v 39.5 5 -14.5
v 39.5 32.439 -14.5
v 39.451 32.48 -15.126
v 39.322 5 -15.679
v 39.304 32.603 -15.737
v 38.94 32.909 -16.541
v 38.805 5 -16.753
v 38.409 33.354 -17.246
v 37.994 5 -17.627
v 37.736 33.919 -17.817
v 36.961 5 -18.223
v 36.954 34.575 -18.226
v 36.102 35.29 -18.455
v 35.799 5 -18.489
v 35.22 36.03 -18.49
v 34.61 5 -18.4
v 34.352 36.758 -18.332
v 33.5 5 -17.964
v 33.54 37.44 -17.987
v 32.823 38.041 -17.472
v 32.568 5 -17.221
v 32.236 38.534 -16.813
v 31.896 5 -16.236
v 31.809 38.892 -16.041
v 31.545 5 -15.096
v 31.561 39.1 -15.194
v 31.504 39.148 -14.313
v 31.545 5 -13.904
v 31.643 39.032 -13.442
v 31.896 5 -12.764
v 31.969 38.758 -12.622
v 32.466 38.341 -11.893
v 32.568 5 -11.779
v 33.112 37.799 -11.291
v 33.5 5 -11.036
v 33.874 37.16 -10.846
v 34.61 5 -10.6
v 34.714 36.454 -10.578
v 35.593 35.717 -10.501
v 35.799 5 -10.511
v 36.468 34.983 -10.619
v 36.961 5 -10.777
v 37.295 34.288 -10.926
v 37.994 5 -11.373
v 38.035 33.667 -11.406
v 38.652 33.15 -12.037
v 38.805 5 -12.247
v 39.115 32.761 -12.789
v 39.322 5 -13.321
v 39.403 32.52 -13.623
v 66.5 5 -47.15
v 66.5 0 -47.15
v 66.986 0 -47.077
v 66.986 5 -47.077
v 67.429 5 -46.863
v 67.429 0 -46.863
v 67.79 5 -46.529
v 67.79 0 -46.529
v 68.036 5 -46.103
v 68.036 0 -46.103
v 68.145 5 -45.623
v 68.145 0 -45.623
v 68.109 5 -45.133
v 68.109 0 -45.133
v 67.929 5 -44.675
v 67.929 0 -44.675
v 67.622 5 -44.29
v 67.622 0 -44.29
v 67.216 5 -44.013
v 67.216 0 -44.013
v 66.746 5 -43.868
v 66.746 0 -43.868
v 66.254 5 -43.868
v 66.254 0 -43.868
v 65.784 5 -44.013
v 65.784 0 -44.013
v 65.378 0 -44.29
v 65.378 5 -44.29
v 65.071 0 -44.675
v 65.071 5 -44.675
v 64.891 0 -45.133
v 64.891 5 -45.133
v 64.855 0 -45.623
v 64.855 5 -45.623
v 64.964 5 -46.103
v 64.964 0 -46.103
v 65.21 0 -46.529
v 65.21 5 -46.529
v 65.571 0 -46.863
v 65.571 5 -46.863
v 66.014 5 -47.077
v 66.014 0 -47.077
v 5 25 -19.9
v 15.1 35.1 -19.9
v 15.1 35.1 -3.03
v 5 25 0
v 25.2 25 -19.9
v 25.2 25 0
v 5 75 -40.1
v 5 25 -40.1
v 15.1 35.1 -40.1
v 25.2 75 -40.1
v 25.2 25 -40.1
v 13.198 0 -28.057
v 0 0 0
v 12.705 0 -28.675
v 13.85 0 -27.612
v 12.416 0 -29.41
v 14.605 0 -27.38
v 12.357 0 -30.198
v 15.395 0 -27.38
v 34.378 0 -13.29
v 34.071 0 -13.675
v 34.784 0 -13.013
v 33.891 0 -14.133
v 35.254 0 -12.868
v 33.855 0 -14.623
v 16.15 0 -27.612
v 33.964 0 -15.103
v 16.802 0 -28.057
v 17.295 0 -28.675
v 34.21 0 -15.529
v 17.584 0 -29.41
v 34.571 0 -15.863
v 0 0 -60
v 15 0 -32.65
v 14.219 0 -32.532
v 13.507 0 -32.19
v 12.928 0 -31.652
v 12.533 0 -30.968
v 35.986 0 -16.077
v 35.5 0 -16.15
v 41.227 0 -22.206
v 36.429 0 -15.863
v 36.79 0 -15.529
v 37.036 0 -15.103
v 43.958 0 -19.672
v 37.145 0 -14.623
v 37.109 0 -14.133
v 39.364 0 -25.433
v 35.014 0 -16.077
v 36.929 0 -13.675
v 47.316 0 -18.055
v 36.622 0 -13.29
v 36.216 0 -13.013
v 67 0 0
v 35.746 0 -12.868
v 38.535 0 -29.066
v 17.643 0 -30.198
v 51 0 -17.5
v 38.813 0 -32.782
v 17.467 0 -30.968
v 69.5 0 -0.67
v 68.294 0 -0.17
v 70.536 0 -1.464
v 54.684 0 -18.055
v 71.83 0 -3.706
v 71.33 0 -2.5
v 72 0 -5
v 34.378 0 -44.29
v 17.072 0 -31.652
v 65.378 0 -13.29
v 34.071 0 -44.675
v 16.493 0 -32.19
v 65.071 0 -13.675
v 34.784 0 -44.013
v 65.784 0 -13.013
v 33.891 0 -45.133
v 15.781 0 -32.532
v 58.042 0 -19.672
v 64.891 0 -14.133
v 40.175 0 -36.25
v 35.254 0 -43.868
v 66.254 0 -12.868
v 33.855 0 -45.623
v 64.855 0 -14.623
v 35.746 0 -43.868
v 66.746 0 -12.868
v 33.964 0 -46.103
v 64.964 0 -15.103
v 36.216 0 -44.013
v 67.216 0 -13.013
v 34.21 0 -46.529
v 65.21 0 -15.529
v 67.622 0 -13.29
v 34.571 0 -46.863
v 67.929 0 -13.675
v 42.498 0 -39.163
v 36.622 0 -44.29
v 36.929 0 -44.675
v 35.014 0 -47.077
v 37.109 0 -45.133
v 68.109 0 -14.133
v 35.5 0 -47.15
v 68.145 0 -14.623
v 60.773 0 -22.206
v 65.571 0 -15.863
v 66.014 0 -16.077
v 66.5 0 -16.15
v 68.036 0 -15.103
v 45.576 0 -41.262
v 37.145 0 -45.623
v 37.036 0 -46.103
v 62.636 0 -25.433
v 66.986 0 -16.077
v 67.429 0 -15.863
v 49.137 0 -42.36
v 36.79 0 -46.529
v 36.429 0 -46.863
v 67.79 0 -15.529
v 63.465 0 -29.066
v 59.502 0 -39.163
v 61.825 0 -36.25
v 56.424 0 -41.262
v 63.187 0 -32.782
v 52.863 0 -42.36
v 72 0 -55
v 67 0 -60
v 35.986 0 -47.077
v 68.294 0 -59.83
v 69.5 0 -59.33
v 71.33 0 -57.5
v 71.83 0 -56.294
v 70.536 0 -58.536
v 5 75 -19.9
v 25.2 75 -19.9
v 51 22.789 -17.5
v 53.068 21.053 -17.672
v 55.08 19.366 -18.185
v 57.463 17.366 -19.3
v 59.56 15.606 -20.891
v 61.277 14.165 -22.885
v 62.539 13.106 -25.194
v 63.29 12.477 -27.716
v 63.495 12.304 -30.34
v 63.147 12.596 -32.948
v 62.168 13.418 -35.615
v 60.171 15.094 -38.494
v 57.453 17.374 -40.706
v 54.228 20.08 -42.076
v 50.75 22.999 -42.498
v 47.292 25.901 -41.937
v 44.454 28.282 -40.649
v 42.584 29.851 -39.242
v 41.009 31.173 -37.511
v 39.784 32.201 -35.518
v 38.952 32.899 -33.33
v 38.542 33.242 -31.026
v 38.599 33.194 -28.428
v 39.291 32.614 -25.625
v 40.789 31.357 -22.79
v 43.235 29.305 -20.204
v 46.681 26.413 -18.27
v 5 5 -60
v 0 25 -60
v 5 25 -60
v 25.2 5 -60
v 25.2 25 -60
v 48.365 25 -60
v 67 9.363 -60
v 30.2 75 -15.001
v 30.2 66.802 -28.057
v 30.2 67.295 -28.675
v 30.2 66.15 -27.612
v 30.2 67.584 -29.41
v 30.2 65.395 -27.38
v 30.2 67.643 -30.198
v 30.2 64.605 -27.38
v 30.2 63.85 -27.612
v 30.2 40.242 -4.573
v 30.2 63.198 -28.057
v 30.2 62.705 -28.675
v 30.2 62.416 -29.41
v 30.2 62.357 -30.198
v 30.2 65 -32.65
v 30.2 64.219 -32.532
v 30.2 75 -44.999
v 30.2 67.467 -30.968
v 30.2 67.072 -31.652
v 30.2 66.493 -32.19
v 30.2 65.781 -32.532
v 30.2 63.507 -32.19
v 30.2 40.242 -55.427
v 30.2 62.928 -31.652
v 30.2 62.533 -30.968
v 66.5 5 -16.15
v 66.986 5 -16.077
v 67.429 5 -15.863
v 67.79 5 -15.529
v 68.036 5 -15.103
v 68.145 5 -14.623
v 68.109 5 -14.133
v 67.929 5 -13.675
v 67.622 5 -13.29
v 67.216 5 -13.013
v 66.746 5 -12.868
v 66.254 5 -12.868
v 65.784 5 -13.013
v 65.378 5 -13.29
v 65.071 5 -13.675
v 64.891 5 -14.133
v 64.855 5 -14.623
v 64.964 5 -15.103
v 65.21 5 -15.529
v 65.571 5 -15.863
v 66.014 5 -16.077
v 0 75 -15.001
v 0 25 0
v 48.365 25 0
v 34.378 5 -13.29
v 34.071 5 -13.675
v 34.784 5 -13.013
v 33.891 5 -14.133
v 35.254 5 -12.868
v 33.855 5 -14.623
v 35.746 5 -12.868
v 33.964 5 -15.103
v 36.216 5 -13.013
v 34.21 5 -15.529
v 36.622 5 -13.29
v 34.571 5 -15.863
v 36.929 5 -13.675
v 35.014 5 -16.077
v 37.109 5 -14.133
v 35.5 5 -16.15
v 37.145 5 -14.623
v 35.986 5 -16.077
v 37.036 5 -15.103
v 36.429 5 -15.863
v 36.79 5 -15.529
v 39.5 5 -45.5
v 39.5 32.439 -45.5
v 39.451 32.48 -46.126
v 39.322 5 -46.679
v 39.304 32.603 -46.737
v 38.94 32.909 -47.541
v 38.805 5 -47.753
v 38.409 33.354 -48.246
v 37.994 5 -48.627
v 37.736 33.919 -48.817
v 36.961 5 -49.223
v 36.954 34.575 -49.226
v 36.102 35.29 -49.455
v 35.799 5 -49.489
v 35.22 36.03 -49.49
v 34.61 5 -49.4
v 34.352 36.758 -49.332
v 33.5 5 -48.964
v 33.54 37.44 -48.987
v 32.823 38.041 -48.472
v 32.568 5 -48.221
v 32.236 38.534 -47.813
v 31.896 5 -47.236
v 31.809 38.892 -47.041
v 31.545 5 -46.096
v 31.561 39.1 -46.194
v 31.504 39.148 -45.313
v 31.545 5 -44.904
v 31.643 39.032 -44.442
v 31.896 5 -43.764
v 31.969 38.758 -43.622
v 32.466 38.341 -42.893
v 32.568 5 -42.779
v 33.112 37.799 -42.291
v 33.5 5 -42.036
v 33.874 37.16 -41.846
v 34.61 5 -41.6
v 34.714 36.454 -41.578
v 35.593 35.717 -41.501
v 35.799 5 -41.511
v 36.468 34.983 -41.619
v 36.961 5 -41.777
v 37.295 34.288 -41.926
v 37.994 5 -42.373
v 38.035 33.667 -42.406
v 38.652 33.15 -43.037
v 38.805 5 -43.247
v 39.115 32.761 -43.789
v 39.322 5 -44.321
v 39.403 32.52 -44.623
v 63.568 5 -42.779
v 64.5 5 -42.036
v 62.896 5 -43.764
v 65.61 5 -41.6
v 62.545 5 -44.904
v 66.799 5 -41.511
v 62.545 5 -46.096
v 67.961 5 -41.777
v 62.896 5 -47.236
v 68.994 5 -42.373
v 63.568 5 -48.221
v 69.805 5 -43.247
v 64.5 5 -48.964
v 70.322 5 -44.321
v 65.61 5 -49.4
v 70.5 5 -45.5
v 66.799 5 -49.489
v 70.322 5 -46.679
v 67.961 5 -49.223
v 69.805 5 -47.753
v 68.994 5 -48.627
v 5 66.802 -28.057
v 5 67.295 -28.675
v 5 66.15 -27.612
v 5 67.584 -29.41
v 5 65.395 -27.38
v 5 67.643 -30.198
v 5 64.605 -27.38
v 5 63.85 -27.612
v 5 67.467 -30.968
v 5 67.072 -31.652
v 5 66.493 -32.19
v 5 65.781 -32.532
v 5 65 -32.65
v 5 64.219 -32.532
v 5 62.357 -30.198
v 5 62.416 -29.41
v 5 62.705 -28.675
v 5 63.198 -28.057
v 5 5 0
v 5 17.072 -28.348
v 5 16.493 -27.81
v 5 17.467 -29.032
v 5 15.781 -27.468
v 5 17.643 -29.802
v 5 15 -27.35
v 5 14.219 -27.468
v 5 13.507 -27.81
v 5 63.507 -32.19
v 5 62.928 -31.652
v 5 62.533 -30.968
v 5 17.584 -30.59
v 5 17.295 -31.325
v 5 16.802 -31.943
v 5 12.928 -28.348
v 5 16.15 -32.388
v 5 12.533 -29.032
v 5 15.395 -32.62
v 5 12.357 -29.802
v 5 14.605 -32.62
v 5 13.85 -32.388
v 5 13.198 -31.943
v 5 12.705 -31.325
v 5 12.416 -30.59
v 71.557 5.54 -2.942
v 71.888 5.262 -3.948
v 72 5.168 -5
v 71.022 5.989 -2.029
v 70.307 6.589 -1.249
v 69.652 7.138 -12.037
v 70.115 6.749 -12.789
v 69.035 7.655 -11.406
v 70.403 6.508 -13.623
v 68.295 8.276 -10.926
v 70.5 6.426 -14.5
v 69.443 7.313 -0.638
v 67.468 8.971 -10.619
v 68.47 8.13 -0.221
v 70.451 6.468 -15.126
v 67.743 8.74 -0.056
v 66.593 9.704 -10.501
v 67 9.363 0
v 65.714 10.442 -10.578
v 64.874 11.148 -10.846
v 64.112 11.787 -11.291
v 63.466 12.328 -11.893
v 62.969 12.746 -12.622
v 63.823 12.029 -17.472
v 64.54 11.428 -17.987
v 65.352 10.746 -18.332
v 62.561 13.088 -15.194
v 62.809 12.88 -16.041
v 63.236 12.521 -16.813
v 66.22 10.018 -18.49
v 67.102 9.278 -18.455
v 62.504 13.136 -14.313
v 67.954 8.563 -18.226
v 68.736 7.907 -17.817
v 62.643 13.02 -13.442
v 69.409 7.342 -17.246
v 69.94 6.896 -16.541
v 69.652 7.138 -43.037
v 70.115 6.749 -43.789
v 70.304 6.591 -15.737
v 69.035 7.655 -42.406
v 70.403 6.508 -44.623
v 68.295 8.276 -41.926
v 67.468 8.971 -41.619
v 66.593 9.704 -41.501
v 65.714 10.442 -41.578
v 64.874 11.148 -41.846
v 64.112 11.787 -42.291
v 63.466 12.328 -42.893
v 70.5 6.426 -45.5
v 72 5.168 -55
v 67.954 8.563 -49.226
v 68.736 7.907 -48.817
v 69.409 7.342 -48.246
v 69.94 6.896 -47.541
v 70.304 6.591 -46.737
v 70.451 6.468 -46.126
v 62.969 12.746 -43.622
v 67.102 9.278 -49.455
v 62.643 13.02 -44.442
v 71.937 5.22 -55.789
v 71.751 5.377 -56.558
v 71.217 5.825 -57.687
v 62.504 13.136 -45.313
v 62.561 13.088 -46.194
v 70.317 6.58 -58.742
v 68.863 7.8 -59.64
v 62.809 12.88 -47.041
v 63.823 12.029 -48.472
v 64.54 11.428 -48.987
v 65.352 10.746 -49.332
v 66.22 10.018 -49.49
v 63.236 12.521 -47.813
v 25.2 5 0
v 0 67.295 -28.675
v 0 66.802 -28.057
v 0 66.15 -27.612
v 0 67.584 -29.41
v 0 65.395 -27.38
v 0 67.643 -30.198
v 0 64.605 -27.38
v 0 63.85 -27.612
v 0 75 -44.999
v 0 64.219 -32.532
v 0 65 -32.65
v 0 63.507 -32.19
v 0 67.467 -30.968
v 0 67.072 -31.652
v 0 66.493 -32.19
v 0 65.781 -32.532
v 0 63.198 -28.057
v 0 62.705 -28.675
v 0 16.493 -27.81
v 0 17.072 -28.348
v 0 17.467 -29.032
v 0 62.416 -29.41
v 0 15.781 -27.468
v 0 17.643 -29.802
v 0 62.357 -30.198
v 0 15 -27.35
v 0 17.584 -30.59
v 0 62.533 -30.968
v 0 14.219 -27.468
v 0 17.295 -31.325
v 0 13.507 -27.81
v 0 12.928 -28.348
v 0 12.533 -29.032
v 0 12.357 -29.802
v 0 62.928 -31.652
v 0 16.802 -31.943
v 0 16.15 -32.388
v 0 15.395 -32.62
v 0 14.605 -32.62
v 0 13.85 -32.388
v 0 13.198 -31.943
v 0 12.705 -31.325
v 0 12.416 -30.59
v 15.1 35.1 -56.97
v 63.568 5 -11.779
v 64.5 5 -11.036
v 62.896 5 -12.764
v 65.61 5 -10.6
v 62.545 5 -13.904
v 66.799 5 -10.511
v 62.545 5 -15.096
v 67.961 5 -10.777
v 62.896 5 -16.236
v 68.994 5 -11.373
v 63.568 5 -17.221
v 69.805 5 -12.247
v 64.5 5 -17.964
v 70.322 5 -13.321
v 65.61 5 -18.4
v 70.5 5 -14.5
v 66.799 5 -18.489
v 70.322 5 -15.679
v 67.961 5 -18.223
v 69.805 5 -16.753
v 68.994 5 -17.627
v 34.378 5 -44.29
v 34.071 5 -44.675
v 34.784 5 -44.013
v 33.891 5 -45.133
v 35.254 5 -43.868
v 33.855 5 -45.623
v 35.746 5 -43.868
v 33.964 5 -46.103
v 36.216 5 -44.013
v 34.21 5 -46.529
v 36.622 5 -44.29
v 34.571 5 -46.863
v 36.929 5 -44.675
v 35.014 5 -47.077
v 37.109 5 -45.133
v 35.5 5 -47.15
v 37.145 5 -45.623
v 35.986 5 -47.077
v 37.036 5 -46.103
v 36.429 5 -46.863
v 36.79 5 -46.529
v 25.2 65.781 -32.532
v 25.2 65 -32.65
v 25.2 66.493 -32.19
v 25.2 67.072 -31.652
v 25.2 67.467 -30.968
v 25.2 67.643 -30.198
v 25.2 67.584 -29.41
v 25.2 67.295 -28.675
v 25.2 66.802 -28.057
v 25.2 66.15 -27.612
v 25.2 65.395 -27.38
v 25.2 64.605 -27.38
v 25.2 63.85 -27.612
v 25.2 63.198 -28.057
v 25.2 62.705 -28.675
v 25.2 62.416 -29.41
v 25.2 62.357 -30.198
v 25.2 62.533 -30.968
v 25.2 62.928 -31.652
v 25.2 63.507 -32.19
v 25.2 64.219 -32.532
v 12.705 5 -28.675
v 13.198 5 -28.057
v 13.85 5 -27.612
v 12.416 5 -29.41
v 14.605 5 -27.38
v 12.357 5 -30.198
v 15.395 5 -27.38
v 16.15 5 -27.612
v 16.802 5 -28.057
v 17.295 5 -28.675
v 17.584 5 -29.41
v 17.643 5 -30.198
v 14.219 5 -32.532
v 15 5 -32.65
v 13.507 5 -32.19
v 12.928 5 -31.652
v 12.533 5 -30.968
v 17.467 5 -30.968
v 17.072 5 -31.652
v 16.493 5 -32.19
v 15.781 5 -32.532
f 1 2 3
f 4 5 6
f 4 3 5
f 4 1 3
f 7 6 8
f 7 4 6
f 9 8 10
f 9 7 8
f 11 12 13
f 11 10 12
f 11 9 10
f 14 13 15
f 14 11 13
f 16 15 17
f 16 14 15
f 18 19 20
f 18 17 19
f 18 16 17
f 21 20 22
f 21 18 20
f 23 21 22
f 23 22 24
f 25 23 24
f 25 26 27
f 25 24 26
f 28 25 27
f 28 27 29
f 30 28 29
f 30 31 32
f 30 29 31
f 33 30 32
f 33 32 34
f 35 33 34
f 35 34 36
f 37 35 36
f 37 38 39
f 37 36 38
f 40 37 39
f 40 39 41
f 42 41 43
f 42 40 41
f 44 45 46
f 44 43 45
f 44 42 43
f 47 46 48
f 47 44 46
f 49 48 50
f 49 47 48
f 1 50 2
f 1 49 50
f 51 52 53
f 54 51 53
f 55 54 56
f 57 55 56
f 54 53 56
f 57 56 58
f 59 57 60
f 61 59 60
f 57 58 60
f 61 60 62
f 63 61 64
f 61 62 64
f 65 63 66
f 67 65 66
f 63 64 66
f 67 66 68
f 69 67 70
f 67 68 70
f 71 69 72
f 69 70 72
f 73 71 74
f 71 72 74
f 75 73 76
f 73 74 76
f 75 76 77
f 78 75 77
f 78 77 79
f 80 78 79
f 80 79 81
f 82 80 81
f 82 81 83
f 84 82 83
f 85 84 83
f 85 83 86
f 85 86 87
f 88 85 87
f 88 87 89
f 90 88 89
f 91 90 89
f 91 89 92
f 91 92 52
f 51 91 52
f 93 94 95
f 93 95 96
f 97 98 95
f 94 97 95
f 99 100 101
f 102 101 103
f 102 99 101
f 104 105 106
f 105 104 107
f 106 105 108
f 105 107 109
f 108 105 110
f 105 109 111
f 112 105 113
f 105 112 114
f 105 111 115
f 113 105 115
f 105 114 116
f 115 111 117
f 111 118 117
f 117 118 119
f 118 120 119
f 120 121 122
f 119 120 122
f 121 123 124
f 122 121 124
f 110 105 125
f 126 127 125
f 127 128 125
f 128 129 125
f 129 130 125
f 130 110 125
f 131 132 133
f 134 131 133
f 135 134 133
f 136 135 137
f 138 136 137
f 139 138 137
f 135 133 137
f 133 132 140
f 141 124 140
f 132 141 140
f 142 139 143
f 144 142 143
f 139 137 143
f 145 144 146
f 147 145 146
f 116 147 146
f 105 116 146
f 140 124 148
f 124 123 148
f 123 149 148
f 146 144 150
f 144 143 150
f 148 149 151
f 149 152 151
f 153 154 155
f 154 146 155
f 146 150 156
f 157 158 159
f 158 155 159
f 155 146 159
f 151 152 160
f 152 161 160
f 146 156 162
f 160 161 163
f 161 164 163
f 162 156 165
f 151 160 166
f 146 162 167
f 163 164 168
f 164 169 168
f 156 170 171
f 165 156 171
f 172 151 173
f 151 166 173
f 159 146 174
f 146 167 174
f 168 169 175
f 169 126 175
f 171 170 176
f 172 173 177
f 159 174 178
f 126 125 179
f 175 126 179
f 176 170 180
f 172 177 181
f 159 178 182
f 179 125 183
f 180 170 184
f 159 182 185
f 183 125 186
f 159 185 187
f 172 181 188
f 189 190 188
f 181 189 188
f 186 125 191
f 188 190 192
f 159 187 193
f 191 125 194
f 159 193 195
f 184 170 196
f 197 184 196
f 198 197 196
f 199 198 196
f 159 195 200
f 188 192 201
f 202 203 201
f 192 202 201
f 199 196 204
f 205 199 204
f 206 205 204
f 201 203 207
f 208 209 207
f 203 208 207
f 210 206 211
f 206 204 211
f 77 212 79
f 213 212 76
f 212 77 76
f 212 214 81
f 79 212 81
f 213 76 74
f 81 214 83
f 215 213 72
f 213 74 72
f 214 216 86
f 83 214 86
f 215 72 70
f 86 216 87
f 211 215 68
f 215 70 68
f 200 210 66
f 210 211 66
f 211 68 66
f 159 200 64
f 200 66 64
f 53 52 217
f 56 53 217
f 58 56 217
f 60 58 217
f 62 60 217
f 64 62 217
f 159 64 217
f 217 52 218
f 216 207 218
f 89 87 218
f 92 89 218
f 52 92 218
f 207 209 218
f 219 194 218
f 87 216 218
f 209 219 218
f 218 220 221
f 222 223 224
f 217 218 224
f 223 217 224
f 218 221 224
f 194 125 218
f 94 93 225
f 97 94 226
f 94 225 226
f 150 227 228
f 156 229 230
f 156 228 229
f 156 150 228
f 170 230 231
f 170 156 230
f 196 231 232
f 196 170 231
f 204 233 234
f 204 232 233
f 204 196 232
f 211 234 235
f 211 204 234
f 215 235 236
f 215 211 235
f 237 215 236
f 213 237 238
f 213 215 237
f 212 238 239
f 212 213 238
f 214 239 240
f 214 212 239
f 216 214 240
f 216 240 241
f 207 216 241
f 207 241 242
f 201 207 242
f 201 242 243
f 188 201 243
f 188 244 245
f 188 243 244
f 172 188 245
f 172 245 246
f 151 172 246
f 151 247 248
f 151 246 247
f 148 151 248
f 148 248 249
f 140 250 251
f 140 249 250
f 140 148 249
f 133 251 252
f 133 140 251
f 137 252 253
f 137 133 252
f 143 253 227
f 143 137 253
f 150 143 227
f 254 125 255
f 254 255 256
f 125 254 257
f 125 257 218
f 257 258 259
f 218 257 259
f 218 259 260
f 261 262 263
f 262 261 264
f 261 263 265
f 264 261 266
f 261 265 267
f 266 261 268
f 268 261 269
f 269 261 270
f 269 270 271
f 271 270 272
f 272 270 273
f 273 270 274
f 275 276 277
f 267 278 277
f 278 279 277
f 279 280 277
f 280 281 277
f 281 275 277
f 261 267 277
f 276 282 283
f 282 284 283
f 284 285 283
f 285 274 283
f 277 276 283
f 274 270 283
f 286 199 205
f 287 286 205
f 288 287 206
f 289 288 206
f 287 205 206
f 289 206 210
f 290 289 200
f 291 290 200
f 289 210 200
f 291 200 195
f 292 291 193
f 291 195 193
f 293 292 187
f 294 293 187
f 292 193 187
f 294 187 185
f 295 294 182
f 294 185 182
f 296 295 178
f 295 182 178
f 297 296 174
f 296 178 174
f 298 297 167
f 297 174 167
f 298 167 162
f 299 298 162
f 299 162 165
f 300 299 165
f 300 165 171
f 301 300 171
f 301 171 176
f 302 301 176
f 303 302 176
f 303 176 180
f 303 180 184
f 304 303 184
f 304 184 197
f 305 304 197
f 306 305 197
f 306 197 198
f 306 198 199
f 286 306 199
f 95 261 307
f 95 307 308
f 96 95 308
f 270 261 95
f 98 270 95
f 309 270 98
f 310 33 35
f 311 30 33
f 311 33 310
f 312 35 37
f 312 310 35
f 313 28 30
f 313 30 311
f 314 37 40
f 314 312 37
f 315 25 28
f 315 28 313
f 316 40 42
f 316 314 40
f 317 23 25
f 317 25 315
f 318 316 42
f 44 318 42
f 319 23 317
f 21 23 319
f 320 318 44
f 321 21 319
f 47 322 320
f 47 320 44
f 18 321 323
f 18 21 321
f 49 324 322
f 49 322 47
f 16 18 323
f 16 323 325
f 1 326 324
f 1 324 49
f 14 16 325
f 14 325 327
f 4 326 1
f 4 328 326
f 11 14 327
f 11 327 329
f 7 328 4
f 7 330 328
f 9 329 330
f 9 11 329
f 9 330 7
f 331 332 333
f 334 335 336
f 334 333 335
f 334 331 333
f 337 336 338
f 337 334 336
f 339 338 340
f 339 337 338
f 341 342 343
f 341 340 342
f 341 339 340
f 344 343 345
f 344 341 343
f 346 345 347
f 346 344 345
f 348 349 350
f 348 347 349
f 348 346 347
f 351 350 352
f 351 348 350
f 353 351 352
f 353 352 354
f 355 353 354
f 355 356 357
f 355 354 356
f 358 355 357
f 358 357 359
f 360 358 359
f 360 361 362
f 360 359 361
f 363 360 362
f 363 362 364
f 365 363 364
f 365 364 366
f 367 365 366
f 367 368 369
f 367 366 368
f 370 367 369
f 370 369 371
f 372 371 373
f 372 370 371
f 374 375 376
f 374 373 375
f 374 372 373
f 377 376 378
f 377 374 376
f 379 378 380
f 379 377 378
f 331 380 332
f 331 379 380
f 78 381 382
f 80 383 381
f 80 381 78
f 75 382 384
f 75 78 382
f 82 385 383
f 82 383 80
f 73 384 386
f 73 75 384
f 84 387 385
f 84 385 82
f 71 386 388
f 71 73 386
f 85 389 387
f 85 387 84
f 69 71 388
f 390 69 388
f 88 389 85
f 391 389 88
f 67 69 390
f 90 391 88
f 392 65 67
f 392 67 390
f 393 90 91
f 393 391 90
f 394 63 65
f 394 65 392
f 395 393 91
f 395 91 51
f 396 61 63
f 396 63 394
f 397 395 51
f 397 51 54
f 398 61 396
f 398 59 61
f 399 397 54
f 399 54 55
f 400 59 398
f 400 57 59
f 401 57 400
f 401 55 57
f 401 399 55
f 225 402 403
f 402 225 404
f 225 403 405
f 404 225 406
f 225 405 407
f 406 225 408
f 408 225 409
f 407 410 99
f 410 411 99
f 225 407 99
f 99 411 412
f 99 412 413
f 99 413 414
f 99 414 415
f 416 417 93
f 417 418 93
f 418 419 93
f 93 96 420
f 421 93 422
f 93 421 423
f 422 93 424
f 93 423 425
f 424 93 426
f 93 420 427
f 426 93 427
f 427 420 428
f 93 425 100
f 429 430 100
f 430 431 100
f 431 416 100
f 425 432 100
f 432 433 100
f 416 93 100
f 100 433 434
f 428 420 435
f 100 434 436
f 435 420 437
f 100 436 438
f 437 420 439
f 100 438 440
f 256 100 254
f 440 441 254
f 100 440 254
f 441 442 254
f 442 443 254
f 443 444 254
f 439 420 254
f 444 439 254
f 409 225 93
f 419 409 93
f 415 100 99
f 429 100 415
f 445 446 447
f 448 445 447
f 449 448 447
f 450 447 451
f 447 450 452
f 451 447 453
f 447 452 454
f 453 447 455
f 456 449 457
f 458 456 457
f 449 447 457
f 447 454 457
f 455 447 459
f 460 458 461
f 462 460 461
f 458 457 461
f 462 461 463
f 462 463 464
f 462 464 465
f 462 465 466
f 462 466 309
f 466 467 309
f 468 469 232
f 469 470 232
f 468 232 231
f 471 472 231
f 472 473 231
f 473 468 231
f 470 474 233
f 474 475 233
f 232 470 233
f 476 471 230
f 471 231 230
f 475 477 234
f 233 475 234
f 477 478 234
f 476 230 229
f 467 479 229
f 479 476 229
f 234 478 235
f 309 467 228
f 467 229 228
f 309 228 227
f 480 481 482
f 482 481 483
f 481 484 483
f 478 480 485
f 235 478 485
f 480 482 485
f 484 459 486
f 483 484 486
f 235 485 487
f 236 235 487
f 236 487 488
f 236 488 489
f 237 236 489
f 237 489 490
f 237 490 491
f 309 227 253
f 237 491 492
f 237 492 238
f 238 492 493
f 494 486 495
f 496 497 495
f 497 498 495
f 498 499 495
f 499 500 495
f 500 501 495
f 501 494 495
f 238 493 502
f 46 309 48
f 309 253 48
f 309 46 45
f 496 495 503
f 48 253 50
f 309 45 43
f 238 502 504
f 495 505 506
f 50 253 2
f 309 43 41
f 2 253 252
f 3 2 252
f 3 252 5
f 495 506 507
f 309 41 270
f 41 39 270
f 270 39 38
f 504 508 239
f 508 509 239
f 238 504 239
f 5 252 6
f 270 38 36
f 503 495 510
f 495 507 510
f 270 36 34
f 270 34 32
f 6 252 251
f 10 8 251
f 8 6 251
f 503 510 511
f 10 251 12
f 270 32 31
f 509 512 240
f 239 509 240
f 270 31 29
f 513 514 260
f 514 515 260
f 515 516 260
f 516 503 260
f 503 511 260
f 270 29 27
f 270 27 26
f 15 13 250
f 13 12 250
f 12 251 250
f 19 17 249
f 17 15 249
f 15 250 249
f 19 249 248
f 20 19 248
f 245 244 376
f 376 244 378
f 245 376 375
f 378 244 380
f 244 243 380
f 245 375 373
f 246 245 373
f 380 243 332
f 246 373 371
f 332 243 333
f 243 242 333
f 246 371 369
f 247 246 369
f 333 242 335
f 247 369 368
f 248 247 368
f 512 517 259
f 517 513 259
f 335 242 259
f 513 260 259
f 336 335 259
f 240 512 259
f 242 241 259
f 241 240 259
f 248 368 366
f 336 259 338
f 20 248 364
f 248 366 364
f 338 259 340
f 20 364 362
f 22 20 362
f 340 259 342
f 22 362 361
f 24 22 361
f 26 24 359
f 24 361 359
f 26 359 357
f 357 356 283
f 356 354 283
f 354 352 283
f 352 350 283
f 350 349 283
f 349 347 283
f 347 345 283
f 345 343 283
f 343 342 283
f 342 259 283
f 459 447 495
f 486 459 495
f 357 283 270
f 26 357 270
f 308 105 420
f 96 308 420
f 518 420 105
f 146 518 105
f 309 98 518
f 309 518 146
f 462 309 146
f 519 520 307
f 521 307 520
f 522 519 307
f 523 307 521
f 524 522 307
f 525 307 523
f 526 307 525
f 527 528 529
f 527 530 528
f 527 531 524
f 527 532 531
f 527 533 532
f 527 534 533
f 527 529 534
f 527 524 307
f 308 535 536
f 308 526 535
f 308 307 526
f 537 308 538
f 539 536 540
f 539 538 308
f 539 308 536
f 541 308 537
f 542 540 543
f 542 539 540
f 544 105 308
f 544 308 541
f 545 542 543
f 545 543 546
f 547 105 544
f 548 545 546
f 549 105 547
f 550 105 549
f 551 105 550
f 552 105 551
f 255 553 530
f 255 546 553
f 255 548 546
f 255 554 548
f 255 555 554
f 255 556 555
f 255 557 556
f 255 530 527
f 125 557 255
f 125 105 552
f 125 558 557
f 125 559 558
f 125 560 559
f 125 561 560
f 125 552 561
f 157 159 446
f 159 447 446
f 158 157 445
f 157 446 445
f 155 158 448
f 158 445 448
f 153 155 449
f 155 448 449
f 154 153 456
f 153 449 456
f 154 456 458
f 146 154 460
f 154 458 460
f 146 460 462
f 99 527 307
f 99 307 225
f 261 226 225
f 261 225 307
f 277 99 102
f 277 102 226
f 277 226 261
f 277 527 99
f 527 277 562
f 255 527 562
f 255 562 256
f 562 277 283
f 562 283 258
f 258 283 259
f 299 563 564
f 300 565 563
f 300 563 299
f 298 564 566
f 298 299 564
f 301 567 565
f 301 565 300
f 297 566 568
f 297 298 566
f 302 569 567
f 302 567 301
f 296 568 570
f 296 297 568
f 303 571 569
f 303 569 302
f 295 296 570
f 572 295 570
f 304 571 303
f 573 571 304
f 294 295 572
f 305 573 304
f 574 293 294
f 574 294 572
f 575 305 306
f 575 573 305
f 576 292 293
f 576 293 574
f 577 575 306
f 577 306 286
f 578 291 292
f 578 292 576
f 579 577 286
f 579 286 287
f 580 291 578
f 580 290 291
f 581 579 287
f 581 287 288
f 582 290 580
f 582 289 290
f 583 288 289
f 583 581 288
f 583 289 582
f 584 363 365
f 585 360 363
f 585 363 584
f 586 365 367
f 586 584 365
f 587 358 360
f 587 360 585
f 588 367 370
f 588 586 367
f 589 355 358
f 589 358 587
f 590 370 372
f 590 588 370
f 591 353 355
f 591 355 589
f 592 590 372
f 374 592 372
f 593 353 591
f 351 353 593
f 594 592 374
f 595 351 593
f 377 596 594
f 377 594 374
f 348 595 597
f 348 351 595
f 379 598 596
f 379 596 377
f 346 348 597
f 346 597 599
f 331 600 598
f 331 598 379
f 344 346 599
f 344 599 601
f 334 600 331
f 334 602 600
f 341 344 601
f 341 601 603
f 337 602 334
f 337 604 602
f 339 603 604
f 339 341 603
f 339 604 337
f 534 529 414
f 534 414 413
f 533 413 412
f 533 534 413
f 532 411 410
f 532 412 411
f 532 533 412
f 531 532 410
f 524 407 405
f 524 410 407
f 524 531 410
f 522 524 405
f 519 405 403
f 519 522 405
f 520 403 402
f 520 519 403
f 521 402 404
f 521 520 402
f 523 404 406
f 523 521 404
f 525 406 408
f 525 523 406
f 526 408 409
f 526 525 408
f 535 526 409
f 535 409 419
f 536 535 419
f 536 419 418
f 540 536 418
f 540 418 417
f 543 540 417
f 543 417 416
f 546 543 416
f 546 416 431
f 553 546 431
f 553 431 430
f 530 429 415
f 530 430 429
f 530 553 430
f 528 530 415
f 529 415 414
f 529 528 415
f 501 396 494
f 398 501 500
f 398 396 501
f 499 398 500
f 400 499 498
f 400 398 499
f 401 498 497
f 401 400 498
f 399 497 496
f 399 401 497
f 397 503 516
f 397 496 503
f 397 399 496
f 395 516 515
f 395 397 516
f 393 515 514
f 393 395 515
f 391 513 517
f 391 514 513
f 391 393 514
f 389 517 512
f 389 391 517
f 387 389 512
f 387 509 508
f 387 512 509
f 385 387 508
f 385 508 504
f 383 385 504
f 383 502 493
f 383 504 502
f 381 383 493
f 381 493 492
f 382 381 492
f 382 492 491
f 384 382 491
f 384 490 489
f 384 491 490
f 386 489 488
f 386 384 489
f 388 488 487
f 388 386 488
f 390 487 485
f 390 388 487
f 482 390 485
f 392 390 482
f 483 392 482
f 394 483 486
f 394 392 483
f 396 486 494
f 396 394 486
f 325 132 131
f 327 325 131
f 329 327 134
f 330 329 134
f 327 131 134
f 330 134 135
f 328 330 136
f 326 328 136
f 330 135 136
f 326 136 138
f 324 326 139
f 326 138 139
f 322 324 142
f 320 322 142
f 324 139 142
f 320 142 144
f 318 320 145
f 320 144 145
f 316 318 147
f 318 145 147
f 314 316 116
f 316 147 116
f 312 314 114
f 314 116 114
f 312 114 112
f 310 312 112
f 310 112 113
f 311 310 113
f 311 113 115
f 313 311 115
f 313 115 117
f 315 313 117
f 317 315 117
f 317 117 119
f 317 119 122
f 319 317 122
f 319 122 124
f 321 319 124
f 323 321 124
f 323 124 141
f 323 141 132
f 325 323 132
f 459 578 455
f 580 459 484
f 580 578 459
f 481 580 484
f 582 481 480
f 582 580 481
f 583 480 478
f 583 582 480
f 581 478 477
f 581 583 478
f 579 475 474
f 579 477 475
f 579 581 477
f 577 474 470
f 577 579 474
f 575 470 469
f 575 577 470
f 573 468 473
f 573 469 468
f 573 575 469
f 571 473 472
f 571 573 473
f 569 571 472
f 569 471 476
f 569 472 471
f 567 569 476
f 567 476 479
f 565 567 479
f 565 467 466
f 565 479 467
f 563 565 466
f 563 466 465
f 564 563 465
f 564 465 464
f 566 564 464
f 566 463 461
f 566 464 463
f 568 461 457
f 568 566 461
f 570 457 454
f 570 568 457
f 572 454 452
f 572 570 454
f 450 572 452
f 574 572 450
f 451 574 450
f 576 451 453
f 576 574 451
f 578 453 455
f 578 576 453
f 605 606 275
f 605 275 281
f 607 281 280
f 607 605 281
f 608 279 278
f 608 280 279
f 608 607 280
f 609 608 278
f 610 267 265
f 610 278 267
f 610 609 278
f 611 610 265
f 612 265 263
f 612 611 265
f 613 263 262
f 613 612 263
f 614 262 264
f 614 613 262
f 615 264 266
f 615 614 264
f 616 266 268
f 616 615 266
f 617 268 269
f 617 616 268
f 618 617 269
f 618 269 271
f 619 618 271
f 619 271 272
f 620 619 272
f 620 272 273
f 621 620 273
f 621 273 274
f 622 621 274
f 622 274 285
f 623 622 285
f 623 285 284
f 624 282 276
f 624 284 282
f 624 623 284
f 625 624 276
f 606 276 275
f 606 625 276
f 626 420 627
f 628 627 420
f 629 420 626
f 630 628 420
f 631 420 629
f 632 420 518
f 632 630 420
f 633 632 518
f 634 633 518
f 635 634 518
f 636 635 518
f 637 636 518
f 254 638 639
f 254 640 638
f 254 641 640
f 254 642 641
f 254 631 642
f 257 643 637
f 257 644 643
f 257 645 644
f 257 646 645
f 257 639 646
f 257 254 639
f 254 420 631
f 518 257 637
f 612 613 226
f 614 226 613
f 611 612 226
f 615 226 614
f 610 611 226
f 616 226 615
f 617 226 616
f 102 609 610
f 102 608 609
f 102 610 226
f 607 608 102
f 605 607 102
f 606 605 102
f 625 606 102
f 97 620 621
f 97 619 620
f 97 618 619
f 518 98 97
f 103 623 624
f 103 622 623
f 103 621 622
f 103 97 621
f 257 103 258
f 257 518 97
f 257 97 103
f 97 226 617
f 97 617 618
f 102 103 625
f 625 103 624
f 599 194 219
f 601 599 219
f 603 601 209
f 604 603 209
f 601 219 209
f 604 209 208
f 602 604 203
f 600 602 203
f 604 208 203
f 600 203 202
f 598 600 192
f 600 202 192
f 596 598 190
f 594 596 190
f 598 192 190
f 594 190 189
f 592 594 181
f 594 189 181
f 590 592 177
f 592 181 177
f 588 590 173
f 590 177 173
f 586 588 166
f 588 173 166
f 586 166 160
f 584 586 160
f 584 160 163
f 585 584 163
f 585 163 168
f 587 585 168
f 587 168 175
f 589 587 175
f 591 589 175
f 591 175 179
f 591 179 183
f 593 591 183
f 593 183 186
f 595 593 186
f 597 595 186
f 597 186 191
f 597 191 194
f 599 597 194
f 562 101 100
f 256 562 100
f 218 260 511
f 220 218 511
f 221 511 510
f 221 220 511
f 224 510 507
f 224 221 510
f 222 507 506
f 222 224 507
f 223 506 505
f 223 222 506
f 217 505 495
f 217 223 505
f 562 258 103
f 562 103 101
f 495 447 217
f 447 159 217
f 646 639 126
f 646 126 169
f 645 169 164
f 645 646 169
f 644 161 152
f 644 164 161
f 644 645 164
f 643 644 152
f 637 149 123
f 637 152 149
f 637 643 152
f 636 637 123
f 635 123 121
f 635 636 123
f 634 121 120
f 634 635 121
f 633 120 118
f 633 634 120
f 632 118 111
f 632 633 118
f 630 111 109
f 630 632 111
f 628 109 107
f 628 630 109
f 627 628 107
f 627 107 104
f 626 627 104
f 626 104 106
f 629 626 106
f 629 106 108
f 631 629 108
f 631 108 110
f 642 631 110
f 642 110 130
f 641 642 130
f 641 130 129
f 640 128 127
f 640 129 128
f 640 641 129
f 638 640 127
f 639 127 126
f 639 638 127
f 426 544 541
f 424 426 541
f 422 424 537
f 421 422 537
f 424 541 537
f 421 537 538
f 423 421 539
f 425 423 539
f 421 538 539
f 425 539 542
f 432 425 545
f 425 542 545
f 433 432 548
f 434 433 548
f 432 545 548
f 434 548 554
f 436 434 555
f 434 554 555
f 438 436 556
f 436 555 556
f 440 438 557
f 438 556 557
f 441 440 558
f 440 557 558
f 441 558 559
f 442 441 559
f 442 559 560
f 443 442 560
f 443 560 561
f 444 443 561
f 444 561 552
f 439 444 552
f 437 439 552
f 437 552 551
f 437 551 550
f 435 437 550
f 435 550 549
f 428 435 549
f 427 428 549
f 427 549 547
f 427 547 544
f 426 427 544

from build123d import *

# Parameters (mm, degrees)
SKETCH1_W               = 72
SKETCH1_H               = 60
BOSS_EXTRUDE1_DEPTH     = 5
SKETCH2_W               = 5
SKETCH2_H               = 60
BOSS_EXTRUDE2_DEPTH     = 70
SKETCH3_W               = 5
SKETCH3_H               = 60
BOSS_EXTRUDE3_DEPTH     = 70
BOSS_EXTRUDE4_DEPTH     = 60
CHAMFER1_SIZE           = 42
CHAMFER1_SIZE_2         = 35.242184509
CHAMFER2_SIZE           = 15.000718891
CHAMFER2_SIZE_2         = 50
SKETCH12_W              = 20.2
SKETCH12_H              = 20.2
CUT_EXTRUDE8_DEPTH      = 67
CUT_EXTRUDE1_DEPTH      = 117.978630527
CUT_EXTRUDE1_DEPTH_BACK = 117.978630527
SKETCH5_R               = 12.5
SKETCH6_R               = 1.65
CUT_EXTRUDE2_DEPTH      = 121.037494142
SKETCH7_R               = 4
CUT_EXTRUDE4_DEPTH      = 117.978630527
CUT_EXTRUDE5_DEPTH      = 105.748460609
CUT_EXTRUDE5_DEPTH_BACK = 105.748460609
SKETCH8_R               = 2.65
CUT_EXTRUDE6_DEPTH      = 121.037494142
CUT_EXTRUDE6_DEPTH_BACK = 121.037494142
SKETCH9_R               = 2.65
FILLET1_R               = 5
SKETCH10_R              = 2.65
CUT_EXTRUDE7_DEPTH      = 10


with BuildPart() as part:
    # Sketch1 → Boss-Extrude1 (new body)
    with BuildSketch(Plane(origin=(0, 0, 0), x_dir=(1, 0, 0), z_dir=(0, 1, 0))):
        with Locations((36, 30)):
            Rectangle(SKETCH1_W, SKETCH1_H)
    extrude(amount=BOSS_EXTRUDE1_DEPTH)

    # Sketch2 → Boss-Extrude2 (add)
    with BuildSketch(Plane(origin=(0, 5, 0), x_dir=(1, 0, 0), z_dir=(0, 1, 0))):
        with Locations((2.5, 30)):
            Rectangle(SKETCH2_W, SKETCH2_H)
    extrude(amount=BOSS_EXTRUDE2_DEPTH)

    # Sketch3 → Boss-Extrude3 (add)
    with BuildSketch(Plane(origin=(0, 5, 0), x_dir=(1, 0, 0), z_dir=(0, 1, 0))):
        with Locations((27.7, 30)):
            Rectangle(SKETCH3_W, SKETCH3_H)
    extrude(amount=BOSS_EXTRUDE3_DEPTH)

    # Sketch11 → Boss-Extrude4 (add)
    with BuildSketch(Plane(origin=(0, 0, -60), x_dir=(-1, 0, 0), z_dir=(0, 0, -1))):
        Polygon((-25.2, 25), (-15.1, 35.1), (-5, 25), (-5, 75), (-25.2, 75), align=None)
    extrude(amount=-BOSS_EXTRUDE4_DEPTH)

    # Chamfer1
    # the kernel refuses this chamfer: 42, 35.242184509 mm, written as the material it adds along each edge
    with BuildSketch(Plane(origin=(30.2, 5, -60), x_dir=(0.9996889667359942, -0.02493932209023436, 0), z_dir=(0, 0, 1))) as chamfer1_piece_1_section:
        Polygon((CHAMFER1_SIZE * 0.999688966736, CHAMFER1_SIZE * 0.0249393220902), (-CHAMFER1_SIZE_2 * 0.0249393220905, CHAMFER1_SIZE_2 * 0.999688966749), (0, 0), align=None)
    chamfer1_piece_1 = extrude(amount=60, mode=Mode.PRIVATE)
    chamfer1_piece_1 = split(chamfer1_piece_1, bisect_by=Plane(origin=(72, 16.573415306, -30), z_dir=(-1, 0, 0)), keep=Keep.TOP, mode=Mode.PRIVATE)
    add(chamfer1_piece_1)

    # Chamfer2
    # the kernel refuses this chamfer: 50, 15.000718891 mm, written as the material it takes off along each edge
    with BuildSketch(Plane(origin=(159.997065138, 75, -60), x_dir=(0, 0.12207157319780576, 0.9925213000318999), z_dir=(-1, 0, 0))) as chamfer2_piece_1:
        Polygon((CHAMFER2_SIZE * 0.99252130002, -CHAMFER2_SIZE * 0.122071573196), (-CHAMFER2_SIZE_2 * 0.122071573198, -CHAMFER2_SIZE_2 * 0.992521300032), (0, 0), align=None)
    extrude(amount=289.794130277, mode=Mode.SUBTRACT)
    with BuildSketch(Plane(origin=(159.997065138, 75, 0), x_dir=(0, 0.12207157319780576, -0.9925213000318999), z_dir=(-1, 0, 0))) as chamfer2_piece_2:
        Polygon((CHAMFER2_SIZE * 0.99252130002, CHAMFER2_SIZE * 0.122071573196), (-CHAMFER2_SIZE_2 * 0.122071573198, CHAMFER2_SIZE_2 * 0.992521300032), (0, 0), align=None)
    extrude(amount=289.794130277, mode=Mode.SUBTRACT)

    # Sketch12 → Cut-Extrude8 (cut)
    with BuildSketch(Plane(origin=(0, 75, 0), x_dir=(1, 0, 0), z_dir=(0, 1, 0))):
        with Locations((15.1, 30)):
            Rectangle(SKETCH12_W, SKETCH12_H)
    extrude(amount=-CUT_EXTRUDE8_DEPTH, mode=Mode.SUBTRACT)

    # Sketch5 → Cut-Extrude1 (cut, two sides: drawn at the far end of the back side and taken through both)
    with BuildSketch(Plane(origin=(0, 5, 0), x_dir=(1, 0, 0), z_dir=(0, 1, 0)).offset(-CUT_EXTRUDE1_DEPTH_BACK)):
        with Locations(Location((51, 30, 0), (0, 0, 270))):
            Circle(SKETCH5_R)
    extrude(amount=CUT_EXTRUDE1_DEPTH + CUT_EXTRUDE1_DEPTH_BACK, mode=Mode.SUBTRACT)

    # Sketch6 → Cut-Extrude2 (cut, through all)
    with BuildSketch(Plane.XZ):
        with Locations(Location((66.5, -14.5, 0), (0, 0, 270))):
            Circle(SKETCH6_R)
        with Locations(Location((66.5, -45.5, 0), (0, 0, 270))):
            Circle(SKETCH6_R)
        with Locations(Location((35.5, -45.5, 0), (0, 0, 270))):
            Circle(SKETCH6_R)
        with Locations(Location((35.5, -14.5, 0), (0, 0, 270))):
            Circle(SKETCH6_R)
    extrude(amount=-CUT_EXTRUDE2_DEPTH, mode=Mode.SUBTRACT)

    # Sketch7 → Cut-Extrude4 (cut, through all)
    with BuildSketch(Plane(origin=(0, 5, 0), x_dir=(1, 0, 0), z_dir=(0, 1, 0))):
        with Locations((66.5, 45.5)):
            Circle(SKETCH7_R)
        with Locations((66.5, 14.5)):
            Circle(SKETCH7_R)
        with Locations((35.5, 14.5)):
            Circle(SKETCH7_R)
        with Locations((35.5, 45.5)):
            Circle(SKETCH7_R)
    extrude(amount=CUT_EXTRUDE4_DEPTH, mode=Mode.SUBTRACT)

    # Sketch8 → Cut-Extrude5 (cut, two sides: drawn at the far end of the back side and taken through both)
    with BuildSketch(Plane(origin=(30.2, 0, 0), x_dir=(0, 0, -1), z_dir=(1, 0, 0)).offset(-CUT_EXTRUDE5_DEPTH_BACK)):
        with Locations((30, 65)):
            Circle(SKETCH8_R)
    extrude(amount=CUT_EXTRUDE5_DEPTH + CUT_EXTRUDE5_DEPTH_BACK, mode=Mode.SUBTRACT)

    # Sketch9 → Cut-Extrude6 (cut, two sides: drawn at the far end of the back side and taken through both)
    with BuildSketch(Plane.XZ.offset(-CUT_EXTRUDE6_DEPTH_BACK)):
        with Locations(Location((15, -30, 0), (0, 0, 270))):
            Circle(SKETCH9_R)
    extrude(amount=CUT_EXTRUDE6_DEPTH + CUT_EXTRUDE6_DEPTH_BACK, mode=Mode.SUBTRACT)

    # Fillet1
    fillet1_edges = [part.edges().sort_by_distance(p)[0] for p in [
        (72, 2.583909963, -60),
        (72, 2.583909963, 0),
    ]]
    fillet(fillet1_edges, radius=FILLET1_R)

    # Sketch10 → Cut-Extrude7 (cut)
    with BuildSketch(Plane.ZY):
        with Locations((-30, 15)):
            Circle(SKETCH10_R)
    extrude(amount=-CUT_EXTRUDE7_DEPTH, mode=Mode.SUBTRACT)


solid = part.part
